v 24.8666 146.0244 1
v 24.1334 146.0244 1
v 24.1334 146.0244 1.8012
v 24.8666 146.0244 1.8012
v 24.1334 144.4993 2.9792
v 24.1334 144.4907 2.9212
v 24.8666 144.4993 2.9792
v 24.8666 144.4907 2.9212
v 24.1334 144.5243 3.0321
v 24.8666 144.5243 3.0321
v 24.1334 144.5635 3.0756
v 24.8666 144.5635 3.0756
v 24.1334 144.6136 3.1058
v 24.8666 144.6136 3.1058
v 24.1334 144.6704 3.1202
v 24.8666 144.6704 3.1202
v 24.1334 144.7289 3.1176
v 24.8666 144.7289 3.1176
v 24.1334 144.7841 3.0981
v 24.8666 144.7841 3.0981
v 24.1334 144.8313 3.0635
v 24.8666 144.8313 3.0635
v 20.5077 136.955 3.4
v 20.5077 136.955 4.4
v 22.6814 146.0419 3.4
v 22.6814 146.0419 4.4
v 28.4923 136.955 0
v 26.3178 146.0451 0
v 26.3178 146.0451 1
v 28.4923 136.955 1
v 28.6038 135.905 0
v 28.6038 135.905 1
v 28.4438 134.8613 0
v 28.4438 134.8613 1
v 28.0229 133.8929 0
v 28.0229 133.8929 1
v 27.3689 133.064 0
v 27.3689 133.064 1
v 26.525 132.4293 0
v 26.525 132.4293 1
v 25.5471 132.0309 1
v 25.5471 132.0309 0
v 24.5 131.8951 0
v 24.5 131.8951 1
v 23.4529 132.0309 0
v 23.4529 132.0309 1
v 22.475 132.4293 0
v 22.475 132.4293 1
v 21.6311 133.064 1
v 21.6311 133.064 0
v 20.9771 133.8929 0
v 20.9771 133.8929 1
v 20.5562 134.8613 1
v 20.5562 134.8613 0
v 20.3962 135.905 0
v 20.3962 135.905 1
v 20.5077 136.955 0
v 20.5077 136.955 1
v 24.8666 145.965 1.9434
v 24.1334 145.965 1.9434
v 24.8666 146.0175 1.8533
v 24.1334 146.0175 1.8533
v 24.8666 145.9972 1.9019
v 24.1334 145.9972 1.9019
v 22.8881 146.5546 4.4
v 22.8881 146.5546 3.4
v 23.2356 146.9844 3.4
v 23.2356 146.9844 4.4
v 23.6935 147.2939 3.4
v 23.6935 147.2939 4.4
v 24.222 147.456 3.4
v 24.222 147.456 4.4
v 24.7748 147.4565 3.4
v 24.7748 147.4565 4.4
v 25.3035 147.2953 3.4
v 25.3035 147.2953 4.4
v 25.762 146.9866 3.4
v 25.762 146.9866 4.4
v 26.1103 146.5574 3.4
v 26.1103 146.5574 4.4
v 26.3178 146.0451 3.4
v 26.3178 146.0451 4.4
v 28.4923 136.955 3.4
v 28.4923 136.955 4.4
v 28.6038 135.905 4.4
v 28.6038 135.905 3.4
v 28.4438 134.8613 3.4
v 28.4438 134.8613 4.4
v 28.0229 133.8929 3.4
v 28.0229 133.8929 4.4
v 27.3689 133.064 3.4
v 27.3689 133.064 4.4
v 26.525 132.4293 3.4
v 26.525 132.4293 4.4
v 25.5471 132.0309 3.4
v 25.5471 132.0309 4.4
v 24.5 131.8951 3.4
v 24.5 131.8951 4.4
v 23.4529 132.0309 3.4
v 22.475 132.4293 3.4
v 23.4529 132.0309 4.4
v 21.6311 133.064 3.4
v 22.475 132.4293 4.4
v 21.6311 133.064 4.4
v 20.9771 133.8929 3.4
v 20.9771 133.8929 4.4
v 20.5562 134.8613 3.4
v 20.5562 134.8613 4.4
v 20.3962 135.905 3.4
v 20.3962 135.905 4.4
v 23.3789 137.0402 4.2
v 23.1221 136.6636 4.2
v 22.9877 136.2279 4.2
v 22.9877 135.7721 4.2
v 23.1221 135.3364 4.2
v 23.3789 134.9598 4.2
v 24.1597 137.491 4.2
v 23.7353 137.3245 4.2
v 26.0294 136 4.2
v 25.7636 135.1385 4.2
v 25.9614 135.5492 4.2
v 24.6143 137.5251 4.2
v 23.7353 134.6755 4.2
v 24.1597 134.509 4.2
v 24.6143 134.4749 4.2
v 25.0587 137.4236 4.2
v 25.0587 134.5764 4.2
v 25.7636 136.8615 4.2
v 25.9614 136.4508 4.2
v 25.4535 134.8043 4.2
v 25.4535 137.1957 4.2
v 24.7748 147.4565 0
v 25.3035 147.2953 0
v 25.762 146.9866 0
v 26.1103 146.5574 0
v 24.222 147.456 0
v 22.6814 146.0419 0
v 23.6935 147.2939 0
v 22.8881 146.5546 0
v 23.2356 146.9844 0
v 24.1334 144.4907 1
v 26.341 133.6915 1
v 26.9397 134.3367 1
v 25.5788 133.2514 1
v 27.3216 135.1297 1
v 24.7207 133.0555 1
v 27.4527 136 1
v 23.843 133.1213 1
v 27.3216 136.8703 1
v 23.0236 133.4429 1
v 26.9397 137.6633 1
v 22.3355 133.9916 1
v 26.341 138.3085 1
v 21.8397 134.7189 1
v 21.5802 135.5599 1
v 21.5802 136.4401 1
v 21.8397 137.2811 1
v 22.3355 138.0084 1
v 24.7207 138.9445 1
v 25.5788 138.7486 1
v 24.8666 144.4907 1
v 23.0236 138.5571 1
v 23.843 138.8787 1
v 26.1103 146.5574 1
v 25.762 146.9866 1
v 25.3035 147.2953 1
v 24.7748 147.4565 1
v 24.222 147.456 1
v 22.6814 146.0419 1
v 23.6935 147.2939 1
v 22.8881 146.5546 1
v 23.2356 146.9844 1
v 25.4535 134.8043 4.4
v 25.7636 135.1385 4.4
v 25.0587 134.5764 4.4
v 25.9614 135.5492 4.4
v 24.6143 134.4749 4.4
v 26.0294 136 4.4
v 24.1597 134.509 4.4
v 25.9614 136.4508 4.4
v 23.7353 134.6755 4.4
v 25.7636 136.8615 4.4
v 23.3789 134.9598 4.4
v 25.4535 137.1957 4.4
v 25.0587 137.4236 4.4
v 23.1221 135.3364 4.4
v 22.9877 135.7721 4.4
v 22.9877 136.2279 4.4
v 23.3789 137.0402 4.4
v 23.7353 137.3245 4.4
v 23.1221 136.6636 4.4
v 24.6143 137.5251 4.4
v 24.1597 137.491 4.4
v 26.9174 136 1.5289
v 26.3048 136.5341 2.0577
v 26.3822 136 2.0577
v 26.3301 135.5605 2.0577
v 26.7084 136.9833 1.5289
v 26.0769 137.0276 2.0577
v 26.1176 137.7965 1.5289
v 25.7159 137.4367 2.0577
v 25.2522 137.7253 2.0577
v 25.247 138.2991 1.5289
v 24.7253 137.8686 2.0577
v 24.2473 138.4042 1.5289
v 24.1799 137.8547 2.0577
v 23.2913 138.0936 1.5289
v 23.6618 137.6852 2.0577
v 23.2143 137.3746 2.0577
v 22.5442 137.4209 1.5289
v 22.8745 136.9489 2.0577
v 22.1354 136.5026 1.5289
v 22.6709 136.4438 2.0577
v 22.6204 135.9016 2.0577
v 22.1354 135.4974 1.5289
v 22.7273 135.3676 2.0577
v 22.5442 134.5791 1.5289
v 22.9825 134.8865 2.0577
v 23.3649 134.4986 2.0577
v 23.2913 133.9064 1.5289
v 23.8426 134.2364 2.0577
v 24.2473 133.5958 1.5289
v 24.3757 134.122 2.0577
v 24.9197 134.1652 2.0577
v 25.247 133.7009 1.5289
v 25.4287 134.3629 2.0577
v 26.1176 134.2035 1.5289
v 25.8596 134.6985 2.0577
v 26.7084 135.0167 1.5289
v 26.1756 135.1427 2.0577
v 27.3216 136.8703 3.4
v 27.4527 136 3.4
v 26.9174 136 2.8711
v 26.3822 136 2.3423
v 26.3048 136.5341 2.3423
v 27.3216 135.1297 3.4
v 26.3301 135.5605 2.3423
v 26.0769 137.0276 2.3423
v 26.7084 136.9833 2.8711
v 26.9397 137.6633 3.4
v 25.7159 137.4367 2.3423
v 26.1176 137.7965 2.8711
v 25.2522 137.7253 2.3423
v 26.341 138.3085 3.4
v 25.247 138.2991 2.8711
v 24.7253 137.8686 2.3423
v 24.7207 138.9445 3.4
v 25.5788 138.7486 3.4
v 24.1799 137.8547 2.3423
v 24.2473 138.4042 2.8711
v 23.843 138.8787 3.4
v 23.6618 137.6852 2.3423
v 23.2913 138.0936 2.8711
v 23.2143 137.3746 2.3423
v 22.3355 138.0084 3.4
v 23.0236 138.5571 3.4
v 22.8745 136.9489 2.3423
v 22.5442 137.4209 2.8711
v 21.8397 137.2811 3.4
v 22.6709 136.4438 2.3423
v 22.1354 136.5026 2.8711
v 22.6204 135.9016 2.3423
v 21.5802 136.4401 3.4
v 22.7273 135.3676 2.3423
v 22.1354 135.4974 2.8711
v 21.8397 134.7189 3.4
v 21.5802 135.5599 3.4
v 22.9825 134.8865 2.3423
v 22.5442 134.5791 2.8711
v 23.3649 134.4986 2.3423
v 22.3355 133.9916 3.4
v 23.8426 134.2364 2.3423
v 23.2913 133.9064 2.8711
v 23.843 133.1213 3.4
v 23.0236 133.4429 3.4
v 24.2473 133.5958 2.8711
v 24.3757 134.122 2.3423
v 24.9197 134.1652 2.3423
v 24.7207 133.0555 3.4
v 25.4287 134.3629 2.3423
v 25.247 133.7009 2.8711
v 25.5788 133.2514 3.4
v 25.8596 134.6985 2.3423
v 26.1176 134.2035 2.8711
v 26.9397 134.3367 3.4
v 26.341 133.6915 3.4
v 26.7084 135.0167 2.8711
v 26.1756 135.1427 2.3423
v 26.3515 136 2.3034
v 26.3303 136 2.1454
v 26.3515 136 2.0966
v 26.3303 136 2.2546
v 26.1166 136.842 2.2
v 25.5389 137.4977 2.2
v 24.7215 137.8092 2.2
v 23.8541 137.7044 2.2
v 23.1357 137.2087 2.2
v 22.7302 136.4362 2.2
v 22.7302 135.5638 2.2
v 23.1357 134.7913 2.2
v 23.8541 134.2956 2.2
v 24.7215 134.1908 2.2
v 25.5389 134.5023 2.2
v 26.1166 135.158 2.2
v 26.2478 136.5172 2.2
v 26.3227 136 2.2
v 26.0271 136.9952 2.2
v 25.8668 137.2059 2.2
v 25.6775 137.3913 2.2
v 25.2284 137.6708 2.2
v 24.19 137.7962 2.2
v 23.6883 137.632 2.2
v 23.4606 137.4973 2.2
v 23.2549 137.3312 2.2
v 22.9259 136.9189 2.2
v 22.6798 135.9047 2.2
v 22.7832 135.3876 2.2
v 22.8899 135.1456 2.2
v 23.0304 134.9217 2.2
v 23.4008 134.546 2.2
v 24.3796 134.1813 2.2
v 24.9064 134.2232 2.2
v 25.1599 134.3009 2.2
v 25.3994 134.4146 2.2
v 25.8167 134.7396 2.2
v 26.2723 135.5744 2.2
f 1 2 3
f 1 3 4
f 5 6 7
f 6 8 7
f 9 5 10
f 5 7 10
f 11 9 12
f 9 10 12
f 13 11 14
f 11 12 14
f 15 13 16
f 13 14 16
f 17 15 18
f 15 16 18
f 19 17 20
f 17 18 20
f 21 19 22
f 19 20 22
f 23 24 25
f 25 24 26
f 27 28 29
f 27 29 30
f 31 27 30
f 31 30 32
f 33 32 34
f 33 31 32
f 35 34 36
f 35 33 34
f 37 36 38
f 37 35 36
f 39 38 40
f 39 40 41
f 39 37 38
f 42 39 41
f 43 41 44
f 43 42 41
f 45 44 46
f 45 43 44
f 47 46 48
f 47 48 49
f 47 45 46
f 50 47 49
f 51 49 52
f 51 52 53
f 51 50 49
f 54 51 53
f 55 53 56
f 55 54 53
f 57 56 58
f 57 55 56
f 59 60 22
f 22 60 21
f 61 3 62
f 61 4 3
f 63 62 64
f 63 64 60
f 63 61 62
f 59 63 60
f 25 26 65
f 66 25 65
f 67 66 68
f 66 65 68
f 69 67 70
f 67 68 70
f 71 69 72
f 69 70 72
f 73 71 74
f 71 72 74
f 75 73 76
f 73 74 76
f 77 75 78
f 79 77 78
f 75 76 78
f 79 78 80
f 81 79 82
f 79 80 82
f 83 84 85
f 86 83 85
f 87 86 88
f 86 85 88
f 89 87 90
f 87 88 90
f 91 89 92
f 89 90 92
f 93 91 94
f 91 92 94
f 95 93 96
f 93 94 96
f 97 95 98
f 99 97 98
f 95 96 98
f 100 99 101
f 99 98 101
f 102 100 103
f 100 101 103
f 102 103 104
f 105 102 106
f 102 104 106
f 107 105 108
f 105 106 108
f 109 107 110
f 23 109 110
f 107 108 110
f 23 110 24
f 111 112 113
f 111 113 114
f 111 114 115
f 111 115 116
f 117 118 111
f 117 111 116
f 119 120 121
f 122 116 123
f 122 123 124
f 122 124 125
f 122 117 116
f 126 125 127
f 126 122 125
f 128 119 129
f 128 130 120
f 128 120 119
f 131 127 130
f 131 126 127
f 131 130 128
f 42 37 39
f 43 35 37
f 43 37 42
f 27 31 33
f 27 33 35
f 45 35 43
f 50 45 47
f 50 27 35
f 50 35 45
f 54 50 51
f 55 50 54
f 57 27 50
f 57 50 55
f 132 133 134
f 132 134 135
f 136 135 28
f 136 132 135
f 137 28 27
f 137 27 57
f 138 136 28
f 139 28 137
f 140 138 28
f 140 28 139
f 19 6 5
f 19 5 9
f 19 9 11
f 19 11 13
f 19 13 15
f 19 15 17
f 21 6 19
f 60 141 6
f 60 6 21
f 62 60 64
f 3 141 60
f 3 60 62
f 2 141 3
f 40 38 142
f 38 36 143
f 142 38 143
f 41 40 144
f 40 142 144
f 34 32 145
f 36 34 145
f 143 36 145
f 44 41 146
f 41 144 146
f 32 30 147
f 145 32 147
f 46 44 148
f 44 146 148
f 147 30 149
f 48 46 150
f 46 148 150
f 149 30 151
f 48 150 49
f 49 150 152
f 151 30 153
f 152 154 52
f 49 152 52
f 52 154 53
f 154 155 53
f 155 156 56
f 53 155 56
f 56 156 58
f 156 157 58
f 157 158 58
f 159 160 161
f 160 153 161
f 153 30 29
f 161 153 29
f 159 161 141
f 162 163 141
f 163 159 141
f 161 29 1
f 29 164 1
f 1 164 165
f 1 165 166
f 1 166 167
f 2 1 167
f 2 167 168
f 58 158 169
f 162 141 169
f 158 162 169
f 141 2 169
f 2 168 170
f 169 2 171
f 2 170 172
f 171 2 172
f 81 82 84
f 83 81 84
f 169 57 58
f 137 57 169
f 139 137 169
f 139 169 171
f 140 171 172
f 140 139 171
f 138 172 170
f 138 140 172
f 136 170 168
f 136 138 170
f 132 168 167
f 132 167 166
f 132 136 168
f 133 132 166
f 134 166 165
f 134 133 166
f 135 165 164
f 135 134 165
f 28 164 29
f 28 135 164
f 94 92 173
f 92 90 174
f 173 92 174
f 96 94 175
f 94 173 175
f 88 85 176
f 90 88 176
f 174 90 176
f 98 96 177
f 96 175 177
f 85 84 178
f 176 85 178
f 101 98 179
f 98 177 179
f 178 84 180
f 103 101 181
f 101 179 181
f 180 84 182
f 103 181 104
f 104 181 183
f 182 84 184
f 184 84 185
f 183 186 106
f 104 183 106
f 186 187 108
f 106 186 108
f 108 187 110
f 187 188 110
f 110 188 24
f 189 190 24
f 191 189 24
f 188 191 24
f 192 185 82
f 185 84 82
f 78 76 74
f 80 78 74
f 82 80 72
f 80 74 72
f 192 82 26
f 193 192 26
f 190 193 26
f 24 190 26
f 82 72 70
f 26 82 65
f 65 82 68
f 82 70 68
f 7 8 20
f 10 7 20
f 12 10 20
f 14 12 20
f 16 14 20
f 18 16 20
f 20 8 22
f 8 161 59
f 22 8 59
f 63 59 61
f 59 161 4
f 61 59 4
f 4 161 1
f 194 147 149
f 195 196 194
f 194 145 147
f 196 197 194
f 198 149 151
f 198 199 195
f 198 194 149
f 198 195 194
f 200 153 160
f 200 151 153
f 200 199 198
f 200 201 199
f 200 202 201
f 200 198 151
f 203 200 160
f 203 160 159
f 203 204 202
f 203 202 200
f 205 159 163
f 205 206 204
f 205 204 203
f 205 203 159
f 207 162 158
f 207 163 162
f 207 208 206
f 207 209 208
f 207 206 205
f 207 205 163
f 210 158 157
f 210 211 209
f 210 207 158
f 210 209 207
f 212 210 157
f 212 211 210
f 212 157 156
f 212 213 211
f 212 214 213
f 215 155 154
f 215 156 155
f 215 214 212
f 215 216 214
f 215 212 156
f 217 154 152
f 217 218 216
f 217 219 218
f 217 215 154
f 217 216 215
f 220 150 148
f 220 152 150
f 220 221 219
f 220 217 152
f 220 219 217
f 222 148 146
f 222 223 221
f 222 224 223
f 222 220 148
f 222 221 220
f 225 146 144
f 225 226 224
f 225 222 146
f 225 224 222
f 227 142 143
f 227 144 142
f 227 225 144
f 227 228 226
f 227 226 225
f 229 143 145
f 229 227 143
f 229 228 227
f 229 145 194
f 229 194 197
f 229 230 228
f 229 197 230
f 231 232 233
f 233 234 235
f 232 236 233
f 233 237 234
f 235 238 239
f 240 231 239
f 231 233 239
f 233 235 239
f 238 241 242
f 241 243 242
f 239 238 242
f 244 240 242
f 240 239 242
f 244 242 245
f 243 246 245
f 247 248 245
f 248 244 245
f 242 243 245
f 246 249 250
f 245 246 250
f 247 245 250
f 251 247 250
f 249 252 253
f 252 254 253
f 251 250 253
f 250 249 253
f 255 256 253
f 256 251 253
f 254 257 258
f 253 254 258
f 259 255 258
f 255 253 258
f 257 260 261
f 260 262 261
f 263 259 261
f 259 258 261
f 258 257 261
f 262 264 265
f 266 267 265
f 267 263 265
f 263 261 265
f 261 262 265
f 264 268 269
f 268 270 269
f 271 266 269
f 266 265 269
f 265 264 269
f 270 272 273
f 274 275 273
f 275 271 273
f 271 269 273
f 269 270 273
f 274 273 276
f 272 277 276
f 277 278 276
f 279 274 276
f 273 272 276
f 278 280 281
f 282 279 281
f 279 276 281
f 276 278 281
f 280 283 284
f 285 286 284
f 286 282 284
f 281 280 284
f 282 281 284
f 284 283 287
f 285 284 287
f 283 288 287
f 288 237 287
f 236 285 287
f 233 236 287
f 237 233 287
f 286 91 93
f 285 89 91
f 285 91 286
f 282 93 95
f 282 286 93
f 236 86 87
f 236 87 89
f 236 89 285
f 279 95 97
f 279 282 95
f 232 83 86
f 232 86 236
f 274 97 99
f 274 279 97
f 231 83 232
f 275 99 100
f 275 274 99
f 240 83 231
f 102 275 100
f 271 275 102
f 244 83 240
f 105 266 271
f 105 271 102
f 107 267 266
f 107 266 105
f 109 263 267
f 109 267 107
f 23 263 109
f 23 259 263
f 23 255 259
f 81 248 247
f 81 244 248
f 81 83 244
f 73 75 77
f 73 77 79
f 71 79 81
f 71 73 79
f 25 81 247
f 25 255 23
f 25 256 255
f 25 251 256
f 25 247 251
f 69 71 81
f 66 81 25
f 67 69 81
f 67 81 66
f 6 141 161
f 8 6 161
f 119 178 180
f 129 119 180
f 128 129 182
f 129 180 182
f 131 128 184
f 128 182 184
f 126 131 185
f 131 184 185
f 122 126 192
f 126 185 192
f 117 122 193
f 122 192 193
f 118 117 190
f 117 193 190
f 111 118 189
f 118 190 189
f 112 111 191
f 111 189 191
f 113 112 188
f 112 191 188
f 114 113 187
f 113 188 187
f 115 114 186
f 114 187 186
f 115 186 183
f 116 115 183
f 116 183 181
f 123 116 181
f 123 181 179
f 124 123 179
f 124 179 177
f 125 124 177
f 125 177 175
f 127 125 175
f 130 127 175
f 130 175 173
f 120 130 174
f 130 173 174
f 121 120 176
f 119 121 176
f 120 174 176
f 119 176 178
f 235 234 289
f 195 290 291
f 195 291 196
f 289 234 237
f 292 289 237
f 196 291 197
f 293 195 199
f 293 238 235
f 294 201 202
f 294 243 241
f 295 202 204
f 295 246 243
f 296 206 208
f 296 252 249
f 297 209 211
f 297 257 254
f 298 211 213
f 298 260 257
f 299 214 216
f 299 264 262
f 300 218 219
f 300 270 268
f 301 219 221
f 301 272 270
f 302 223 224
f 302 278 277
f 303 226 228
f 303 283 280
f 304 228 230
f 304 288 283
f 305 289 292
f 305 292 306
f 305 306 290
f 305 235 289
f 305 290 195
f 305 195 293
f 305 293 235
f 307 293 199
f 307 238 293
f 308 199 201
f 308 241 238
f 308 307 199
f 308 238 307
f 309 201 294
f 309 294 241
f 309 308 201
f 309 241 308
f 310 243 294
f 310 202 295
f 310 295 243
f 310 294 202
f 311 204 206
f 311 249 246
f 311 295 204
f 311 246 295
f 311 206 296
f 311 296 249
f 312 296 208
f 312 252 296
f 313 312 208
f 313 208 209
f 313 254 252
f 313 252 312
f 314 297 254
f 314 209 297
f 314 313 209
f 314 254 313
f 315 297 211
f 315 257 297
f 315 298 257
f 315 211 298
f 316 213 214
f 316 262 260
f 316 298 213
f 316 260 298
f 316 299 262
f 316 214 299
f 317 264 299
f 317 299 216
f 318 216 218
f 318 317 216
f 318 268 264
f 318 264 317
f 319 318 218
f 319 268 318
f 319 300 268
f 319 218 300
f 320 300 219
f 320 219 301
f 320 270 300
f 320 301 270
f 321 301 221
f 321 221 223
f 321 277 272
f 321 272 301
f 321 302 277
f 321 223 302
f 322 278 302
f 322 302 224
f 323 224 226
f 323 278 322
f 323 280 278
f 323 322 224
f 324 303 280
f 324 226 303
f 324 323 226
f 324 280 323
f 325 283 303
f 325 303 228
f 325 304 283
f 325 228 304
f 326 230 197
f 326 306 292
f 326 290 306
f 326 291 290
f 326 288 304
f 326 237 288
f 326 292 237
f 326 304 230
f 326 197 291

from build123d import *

# Parameters (mm, degrees)
EXTRUDE_1_DEPTH     = 1
SKETCH_3_R          = 2.952738467
SKETCH_5_R          = 1.738152606
SKETCH_6_W          = 0.733255876
SKETCH_6_H          = 1.533688363
EXTRUDE_2_DEPTH     = 2.4
CUT_EXTRUDE_1_DEPTH = 2.4
FILLET_1_R          = 0.2
FILLET_2_R          = 0.2
SKETCH_8_R          = 1.529357016
CUT_EXTRUDE_3_DEPTH = 0.2


with BuildPart() as part:
    # 草图2 → 凸台-拉伸1 (new body)
    with BuildSketch(Plane.XY):
        with BuildLine():
            Line((20.507695312, 136.955018135), (22.681412951, 146.041906443))
            ThreePointArc((22.681412951, 146.041906443), (24.498369442, 147.476769267), (26.317825582, 146.045077413))
            Line((26.317825582, 146.045077413), (28.492304397, 136.955019349))
            ThreePointArc((28.492304397, 136.955019349), (24.500000624, 131.895057082), (20.507695312, 136.955018135))
        make_face()
    extrude_1 = extrude(amount=EXTRUDE_1_DEPTH)

    # 草图3 → 放样2 section 0
    with BuildSketch(Plane.XY.offset(1)):
        with Locations((24.5, 136)):
            Circle(SKETCH_3_R)
    # 草图5 → 放样2 section 1
    with BuildSketch(Plane(origin=(0, 0, 2.2), x_dir=(-1, 0, 0), z_dir=(0, 0, -1))):
        with Locations((-24.5, 136)):
            Circle(SKETCH_5_R)
    loft_2 = loft()

    # 草图6 → 凸台-拉伸2 (add)
    with BuildSketch(Plane.XY.offset(1)):
        with Locations((24.5, 145.257576629)):
            Rectangle(SKETCH_6_W, SKETCH_6_H)
    extrude(amount=EXTRUDE_2_DEPTH)

    # 草图7 → 切除-拉伸1 (cut)
    with BuildSketch(Plane.ZY.offset(-24.133372062)):
        Polygon((1.884714406, 146.02442081), (3.4, 144.490732447), (3.4, 146.02442081), align=None)
    extrude(amount=-CUT_EXTRUDE_1_DEPTH, mode=Mode.SUBTRACT)

    # 圆角1
    fillet_1_edges = [part.edges().sort_by_distance(p)[0] for p in [
        (24.5, 144.490732447, 3.4),
        (24.5, 146.02442081, 1.884714406),
    ]]
    fillet(fillet_1_edges, radius=FILLET_1_R)

    # 镜向4: 放样2 across plane
    add(loft_2.mirror(Plane(origin=(0, 0, 2.2), x_dir=(1, 0, 0), z_dir=(0, 0, -1))))

    # 镜向5: 凸台-拉伸1 across plane
    add(extrude_1.mirror(Plane(origin=(0, 0, 2.2), x_dir=(1, 0, 0), z_dir=(0, 0, -1))))

    # 圆角2
    fillet_2_edges = [part.edges().sort_by_distance(p)[0] for p in [
        (22.761847394, 136, 2.2),
    ]]
    fillet(fillet_2_edges, radius=FILLET_2_R)

    # 草图8 → 切除-拉伸3 (cut)
    with BuildSketch(Plane.XY.offset(4.4)):
        with Locations((24.5, 136)):
            Circle(SKETCH_8_R)
    extrude(amount=-CUT_EXTRUDE_3_DEPTH, mode=Mode.SUBTRACT)


solid = part.part
